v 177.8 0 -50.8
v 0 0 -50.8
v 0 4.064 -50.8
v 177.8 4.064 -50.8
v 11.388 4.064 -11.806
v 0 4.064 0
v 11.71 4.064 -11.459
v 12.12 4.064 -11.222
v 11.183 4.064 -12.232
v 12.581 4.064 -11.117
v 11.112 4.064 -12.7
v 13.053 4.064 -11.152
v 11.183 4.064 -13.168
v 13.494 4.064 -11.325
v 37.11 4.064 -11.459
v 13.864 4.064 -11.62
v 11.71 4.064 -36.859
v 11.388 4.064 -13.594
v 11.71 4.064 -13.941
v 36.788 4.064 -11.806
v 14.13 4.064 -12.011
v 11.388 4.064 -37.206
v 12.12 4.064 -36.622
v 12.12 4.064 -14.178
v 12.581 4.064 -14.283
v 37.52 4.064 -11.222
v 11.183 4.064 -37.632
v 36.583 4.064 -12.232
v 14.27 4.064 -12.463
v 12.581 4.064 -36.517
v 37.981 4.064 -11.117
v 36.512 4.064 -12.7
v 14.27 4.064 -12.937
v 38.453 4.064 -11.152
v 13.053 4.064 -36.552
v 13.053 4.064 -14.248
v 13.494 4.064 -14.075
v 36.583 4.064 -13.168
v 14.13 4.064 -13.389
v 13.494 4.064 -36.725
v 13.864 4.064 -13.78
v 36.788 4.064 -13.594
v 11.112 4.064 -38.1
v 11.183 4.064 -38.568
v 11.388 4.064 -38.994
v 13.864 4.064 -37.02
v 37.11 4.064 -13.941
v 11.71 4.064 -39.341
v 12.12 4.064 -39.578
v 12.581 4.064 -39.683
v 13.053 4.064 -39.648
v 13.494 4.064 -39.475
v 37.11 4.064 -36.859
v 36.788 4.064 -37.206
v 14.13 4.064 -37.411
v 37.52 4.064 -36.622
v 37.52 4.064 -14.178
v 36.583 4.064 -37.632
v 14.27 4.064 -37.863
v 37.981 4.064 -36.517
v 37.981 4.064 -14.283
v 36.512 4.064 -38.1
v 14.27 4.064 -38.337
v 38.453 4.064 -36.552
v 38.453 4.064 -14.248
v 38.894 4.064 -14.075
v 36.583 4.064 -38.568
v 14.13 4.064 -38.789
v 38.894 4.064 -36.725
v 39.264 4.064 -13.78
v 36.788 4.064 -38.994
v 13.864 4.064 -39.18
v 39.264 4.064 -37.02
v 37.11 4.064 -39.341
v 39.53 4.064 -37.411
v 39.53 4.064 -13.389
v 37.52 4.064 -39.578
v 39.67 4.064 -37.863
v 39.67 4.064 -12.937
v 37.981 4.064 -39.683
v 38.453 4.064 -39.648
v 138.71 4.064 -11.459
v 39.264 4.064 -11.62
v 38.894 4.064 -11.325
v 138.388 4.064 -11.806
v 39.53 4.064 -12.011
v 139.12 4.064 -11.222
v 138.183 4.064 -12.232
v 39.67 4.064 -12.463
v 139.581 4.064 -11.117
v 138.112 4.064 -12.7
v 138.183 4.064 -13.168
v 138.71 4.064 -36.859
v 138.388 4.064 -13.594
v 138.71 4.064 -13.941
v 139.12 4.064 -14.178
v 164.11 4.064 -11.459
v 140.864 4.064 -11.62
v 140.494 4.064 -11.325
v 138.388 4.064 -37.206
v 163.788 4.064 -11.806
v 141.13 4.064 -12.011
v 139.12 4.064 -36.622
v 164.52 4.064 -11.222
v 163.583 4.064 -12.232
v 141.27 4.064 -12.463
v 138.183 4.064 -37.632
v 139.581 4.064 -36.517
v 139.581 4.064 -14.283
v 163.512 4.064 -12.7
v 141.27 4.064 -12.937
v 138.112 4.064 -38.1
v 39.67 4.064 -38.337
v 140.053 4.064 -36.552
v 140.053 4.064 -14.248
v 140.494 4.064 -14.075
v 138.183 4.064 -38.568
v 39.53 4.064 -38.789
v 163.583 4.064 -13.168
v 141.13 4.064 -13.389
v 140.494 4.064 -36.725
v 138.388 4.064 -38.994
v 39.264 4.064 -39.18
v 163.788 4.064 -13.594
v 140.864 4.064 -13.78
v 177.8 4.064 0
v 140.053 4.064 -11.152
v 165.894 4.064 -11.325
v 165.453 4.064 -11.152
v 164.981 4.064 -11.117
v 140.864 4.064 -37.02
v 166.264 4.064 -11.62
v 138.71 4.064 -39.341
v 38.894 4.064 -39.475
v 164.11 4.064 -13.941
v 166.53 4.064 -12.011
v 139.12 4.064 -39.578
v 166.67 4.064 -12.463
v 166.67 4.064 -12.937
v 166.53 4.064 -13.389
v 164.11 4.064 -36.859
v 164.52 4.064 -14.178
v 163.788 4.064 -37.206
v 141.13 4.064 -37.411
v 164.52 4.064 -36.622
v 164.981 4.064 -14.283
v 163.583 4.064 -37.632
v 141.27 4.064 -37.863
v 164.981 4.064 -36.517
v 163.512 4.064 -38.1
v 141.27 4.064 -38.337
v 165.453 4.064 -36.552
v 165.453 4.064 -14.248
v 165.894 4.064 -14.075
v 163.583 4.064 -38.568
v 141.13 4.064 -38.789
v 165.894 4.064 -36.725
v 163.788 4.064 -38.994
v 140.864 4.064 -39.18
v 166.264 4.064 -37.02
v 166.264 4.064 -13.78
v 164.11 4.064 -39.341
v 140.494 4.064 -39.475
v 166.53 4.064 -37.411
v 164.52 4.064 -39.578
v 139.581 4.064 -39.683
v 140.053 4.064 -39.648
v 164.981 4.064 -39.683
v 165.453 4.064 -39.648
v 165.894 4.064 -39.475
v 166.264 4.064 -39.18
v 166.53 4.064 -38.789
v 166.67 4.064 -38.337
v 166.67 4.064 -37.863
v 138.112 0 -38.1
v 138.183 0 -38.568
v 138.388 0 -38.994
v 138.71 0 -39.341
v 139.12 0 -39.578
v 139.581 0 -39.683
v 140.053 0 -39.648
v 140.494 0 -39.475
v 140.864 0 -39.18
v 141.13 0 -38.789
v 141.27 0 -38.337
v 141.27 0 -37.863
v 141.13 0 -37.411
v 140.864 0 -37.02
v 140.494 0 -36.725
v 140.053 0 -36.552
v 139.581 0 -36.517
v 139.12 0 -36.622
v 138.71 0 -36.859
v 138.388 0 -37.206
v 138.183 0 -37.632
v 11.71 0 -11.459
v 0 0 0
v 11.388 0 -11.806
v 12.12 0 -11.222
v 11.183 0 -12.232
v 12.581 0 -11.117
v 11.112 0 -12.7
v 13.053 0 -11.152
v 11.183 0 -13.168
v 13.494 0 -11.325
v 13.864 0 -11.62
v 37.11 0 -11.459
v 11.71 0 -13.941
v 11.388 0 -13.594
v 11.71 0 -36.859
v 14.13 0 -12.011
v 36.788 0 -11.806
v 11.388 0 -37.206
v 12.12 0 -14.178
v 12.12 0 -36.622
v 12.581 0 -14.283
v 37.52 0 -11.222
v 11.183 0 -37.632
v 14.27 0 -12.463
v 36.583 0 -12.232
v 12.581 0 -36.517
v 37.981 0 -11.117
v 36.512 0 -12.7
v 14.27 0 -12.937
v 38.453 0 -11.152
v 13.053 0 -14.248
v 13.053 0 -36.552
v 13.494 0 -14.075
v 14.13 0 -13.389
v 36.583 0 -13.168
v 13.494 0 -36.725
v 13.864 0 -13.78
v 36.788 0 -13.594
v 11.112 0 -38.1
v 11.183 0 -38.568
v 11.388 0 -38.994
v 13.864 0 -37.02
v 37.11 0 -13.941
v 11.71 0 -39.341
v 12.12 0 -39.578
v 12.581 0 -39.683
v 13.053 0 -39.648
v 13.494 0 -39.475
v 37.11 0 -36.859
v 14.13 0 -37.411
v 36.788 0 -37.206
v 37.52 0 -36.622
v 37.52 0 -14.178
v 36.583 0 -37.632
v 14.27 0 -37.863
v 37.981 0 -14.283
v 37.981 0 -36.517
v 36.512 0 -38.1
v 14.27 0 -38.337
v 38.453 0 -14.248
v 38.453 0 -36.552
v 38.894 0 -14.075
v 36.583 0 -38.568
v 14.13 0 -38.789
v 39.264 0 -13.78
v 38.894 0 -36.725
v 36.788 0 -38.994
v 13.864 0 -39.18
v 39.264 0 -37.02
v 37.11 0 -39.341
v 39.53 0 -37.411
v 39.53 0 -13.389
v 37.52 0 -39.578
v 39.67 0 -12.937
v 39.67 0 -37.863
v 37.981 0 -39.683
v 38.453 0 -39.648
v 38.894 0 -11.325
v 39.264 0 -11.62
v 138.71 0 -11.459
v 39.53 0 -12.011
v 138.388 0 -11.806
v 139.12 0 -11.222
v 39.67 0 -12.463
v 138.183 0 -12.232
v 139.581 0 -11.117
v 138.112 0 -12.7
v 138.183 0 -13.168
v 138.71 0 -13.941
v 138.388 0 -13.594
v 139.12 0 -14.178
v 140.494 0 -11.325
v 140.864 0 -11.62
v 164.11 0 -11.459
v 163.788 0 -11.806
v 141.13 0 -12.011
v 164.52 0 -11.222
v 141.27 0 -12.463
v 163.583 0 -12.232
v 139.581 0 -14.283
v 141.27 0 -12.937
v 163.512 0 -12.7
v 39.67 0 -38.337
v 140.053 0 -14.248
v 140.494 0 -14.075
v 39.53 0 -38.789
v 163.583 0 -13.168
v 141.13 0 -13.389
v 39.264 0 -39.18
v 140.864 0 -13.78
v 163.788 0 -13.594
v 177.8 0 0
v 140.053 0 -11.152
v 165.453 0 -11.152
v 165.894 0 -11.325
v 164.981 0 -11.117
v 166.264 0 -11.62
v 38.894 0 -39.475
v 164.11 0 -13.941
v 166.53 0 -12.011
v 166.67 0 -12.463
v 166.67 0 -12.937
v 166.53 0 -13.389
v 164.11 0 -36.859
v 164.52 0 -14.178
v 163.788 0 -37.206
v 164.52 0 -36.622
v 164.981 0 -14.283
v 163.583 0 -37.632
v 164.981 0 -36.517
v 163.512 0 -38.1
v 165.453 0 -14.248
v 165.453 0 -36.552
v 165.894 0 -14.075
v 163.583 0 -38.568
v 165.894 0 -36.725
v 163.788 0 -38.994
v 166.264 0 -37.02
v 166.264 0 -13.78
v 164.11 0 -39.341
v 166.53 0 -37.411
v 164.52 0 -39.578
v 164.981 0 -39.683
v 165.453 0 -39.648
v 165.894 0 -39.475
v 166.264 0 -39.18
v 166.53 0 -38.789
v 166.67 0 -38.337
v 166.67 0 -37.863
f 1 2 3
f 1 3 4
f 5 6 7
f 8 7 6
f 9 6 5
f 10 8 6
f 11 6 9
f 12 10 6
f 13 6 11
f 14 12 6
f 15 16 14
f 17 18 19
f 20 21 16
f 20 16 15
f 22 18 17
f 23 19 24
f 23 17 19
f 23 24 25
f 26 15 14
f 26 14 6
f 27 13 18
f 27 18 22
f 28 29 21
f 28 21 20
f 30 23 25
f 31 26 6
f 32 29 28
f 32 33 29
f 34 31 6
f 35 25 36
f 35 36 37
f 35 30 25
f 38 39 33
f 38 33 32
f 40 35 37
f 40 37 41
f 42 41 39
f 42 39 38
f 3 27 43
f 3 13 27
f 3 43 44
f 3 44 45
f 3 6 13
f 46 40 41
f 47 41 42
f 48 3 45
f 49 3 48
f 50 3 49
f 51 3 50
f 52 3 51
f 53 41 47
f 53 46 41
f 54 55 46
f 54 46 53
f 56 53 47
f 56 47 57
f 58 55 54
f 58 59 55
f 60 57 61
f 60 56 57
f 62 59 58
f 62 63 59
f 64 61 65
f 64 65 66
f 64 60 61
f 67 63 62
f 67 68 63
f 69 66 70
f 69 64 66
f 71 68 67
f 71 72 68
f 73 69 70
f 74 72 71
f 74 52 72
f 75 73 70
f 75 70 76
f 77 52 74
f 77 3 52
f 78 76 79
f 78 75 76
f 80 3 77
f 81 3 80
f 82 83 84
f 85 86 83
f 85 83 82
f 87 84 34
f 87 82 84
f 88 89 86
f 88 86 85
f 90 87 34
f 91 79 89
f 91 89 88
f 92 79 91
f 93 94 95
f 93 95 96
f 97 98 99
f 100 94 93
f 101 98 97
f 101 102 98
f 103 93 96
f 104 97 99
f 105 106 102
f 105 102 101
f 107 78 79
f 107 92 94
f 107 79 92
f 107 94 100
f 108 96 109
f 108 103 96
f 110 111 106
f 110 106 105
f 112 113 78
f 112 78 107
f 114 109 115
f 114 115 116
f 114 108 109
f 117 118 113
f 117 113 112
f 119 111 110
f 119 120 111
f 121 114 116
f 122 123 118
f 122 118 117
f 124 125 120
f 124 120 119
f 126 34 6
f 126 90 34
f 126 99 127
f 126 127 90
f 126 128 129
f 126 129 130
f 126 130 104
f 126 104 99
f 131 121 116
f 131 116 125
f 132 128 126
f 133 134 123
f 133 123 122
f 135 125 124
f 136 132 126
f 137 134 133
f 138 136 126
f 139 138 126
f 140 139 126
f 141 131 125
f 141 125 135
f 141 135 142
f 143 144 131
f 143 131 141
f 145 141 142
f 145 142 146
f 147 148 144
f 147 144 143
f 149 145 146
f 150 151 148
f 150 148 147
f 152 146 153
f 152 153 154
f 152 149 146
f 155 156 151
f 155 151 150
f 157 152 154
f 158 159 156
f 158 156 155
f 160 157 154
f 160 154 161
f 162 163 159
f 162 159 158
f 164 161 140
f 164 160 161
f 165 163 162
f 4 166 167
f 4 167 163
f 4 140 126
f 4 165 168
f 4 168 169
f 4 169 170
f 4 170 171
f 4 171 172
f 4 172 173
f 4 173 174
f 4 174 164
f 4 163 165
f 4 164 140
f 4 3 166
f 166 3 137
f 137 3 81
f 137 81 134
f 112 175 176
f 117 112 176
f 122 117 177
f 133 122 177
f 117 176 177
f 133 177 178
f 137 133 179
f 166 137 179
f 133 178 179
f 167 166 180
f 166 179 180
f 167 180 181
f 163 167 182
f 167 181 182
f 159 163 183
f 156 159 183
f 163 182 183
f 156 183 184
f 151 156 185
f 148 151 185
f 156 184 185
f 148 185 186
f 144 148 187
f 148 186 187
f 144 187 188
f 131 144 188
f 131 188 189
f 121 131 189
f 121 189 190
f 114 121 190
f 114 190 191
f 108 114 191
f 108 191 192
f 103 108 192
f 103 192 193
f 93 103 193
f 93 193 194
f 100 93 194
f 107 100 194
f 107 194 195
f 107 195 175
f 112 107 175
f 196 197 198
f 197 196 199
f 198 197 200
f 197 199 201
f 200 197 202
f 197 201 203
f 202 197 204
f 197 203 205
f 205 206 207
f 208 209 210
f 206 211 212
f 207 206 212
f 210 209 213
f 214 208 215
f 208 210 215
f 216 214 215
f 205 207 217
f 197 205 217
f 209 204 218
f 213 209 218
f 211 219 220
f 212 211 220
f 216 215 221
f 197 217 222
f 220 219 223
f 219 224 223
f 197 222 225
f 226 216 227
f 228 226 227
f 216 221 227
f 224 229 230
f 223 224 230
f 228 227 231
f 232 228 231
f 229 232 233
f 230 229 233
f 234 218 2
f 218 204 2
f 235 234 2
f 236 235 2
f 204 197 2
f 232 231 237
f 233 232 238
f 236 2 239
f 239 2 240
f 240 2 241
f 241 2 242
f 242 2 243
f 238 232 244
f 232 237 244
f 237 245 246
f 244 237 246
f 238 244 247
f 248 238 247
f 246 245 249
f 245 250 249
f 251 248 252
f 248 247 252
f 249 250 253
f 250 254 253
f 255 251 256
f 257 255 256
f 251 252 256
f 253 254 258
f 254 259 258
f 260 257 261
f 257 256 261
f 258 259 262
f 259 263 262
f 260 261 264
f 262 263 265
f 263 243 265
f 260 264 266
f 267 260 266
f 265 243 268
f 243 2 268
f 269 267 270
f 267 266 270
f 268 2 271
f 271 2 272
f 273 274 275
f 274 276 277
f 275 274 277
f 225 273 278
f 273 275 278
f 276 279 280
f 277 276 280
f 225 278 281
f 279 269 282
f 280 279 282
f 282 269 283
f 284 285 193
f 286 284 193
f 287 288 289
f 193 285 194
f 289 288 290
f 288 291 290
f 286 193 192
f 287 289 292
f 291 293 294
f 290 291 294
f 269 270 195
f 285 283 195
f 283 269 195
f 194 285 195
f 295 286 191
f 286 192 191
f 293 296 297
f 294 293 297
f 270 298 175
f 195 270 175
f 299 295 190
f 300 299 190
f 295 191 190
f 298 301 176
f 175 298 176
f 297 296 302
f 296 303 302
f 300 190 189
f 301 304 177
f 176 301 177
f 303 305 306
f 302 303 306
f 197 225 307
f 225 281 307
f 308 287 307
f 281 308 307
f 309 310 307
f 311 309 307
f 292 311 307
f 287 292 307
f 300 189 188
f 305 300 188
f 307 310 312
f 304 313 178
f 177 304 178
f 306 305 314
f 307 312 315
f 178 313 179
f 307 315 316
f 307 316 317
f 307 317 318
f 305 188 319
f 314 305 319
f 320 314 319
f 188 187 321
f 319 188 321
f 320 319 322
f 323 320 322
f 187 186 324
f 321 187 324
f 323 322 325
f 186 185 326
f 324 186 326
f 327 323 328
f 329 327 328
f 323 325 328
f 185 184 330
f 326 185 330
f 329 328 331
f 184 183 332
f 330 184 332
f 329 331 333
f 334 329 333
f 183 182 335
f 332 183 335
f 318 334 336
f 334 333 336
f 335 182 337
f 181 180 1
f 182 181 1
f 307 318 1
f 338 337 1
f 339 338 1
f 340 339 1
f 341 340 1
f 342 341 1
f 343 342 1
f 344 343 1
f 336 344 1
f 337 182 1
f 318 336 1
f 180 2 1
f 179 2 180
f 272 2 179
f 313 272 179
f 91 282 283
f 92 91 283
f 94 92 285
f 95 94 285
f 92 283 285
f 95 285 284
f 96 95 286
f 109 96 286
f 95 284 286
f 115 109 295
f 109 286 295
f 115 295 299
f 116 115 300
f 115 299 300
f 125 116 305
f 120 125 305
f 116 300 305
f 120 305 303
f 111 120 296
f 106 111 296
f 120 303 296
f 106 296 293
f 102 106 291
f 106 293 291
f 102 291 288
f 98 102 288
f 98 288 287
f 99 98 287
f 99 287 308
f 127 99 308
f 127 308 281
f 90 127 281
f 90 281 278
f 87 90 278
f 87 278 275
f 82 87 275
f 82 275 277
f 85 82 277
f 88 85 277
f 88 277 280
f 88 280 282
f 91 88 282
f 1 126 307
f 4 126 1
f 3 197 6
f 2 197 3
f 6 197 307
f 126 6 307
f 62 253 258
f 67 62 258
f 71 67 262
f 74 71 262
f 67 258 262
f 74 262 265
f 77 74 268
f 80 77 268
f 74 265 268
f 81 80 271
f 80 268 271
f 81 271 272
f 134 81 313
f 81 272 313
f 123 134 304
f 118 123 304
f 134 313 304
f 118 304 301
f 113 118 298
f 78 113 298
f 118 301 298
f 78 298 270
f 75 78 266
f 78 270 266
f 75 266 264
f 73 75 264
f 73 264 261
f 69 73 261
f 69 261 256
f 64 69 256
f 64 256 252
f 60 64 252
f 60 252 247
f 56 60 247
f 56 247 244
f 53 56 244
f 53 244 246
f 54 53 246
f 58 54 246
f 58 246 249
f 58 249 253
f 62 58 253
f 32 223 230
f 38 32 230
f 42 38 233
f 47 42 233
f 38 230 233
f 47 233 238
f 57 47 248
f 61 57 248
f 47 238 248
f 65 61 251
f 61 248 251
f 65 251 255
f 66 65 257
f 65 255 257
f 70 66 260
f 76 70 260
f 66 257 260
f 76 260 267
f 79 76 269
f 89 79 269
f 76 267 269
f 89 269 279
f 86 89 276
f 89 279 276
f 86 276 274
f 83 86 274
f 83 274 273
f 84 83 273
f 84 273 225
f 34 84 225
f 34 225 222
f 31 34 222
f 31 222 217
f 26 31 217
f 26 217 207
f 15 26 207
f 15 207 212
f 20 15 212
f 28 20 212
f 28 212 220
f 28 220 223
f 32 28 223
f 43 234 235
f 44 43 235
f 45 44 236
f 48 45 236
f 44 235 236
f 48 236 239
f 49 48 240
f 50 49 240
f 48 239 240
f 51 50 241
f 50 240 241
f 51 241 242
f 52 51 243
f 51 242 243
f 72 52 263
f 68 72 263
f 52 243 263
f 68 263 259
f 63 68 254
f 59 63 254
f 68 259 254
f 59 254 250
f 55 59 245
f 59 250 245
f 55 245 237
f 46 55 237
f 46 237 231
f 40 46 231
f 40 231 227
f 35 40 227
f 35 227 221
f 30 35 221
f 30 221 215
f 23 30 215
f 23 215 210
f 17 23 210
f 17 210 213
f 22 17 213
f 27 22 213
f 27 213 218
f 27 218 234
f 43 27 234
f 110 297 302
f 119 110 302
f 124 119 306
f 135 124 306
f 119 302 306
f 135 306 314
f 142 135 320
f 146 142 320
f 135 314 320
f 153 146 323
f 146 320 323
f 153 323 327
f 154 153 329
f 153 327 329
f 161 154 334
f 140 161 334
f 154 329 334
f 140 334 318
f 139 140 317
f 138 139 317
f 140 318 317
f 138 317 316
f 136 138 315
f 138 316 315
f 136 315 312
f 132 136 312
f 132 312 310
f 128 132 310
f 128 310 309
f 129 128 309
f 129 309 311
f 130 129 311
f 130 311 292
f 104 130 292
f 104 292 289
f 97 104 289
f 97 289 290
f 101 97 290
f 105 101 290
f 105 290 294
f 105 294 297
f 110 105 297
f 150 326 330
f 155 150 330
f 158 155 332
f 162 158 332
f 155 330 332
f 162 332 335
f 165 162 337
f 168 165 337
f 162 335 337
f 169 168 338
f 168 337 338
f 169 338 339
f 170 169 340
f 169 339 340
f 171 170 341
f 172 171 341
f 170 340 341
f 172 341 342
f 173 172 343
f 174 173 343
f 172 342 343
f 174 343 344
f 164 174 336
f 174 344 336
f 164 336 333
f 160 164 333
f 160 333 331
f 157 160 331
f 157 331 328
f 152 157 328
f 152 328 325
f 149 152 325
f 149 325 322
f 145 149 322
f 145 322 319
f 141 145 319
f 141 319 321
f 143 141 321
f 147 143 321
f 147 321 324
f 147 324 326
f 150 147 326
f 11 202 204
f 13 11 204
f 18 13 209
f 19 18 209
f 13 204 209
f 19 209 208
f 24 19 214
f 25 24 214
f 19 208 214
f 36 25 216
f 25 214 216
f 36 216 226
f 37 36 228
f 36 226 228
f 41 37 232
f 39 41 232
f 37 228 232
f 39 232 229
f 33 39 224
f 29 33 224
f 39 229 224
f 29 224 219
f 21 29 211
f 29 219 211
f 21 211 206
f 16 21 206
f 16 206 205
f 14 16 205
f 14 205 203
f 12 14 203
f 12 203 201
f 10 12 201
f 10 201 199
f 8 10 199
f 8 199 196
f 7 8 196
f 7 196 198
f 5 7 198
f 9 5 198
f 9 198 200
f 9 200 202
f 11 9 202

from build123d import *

# Parameters (mm, degrees)
SKETCH1_W                    = 304.8
SKETCH1_H                    = 50.8
BOSS_EXTRUDE1_DEPTH          = 4.064
F_1_8_0_125_DIAMETER_HOLE1_D = 3.175
SKETCH4_W                    = 127
SKETCH4_H                    = 50.8
CUT_EXTRUDE1_DEPTH           = 5.064


with BuildPart() as part:
    # Sketch1 → Boss-Extrude1 (new body)
    with BuildSketch(Plane(origin=(0, 0, 0), x_dir=(1, 0, 0), z_dir=(0, 1, 0))):
        with Locations((152.4, 25.4)):
            Rectangle(SKETCH1_W, SKETCH1_H)
    extrude(amount=BOSS_EXTRUDE1_DEPTH)

    # 1/8 (0.125) Diameter Hole1 (through all)
    with Locations(Plane(origin=(0, 4.064, 0), x_dir=(1, 0, 0), z_dir=(0, 1, 0))):
        with Locations((12.7, 12.7), (38.1, 38.1), (12.7, 38.1), (38.1, 12.7), (139.7, 12.7), (165.1, 38.1), (139.7, 38.1), (165.1, 12.7)):
            Hole(F_1_8_0_125_DIAMETER_HOLE1_D / 2)

    # Sketch4 → Cut-Extrude1 (cut, through all)
    with BuildSketch(Plane(origin=(0, 4.064, 0), x_dir=(1, 0, 0), z_dir=(0, 1, 0))):
        with Locations((241.3, 25.4)):
            Rectangle(SKETCH4_W, SKETCH4_H)
    extrude(amount=-CUT_EXTRUDE1_DEPTH, mode=Mode.SUBTRACT)


solid = part.part
